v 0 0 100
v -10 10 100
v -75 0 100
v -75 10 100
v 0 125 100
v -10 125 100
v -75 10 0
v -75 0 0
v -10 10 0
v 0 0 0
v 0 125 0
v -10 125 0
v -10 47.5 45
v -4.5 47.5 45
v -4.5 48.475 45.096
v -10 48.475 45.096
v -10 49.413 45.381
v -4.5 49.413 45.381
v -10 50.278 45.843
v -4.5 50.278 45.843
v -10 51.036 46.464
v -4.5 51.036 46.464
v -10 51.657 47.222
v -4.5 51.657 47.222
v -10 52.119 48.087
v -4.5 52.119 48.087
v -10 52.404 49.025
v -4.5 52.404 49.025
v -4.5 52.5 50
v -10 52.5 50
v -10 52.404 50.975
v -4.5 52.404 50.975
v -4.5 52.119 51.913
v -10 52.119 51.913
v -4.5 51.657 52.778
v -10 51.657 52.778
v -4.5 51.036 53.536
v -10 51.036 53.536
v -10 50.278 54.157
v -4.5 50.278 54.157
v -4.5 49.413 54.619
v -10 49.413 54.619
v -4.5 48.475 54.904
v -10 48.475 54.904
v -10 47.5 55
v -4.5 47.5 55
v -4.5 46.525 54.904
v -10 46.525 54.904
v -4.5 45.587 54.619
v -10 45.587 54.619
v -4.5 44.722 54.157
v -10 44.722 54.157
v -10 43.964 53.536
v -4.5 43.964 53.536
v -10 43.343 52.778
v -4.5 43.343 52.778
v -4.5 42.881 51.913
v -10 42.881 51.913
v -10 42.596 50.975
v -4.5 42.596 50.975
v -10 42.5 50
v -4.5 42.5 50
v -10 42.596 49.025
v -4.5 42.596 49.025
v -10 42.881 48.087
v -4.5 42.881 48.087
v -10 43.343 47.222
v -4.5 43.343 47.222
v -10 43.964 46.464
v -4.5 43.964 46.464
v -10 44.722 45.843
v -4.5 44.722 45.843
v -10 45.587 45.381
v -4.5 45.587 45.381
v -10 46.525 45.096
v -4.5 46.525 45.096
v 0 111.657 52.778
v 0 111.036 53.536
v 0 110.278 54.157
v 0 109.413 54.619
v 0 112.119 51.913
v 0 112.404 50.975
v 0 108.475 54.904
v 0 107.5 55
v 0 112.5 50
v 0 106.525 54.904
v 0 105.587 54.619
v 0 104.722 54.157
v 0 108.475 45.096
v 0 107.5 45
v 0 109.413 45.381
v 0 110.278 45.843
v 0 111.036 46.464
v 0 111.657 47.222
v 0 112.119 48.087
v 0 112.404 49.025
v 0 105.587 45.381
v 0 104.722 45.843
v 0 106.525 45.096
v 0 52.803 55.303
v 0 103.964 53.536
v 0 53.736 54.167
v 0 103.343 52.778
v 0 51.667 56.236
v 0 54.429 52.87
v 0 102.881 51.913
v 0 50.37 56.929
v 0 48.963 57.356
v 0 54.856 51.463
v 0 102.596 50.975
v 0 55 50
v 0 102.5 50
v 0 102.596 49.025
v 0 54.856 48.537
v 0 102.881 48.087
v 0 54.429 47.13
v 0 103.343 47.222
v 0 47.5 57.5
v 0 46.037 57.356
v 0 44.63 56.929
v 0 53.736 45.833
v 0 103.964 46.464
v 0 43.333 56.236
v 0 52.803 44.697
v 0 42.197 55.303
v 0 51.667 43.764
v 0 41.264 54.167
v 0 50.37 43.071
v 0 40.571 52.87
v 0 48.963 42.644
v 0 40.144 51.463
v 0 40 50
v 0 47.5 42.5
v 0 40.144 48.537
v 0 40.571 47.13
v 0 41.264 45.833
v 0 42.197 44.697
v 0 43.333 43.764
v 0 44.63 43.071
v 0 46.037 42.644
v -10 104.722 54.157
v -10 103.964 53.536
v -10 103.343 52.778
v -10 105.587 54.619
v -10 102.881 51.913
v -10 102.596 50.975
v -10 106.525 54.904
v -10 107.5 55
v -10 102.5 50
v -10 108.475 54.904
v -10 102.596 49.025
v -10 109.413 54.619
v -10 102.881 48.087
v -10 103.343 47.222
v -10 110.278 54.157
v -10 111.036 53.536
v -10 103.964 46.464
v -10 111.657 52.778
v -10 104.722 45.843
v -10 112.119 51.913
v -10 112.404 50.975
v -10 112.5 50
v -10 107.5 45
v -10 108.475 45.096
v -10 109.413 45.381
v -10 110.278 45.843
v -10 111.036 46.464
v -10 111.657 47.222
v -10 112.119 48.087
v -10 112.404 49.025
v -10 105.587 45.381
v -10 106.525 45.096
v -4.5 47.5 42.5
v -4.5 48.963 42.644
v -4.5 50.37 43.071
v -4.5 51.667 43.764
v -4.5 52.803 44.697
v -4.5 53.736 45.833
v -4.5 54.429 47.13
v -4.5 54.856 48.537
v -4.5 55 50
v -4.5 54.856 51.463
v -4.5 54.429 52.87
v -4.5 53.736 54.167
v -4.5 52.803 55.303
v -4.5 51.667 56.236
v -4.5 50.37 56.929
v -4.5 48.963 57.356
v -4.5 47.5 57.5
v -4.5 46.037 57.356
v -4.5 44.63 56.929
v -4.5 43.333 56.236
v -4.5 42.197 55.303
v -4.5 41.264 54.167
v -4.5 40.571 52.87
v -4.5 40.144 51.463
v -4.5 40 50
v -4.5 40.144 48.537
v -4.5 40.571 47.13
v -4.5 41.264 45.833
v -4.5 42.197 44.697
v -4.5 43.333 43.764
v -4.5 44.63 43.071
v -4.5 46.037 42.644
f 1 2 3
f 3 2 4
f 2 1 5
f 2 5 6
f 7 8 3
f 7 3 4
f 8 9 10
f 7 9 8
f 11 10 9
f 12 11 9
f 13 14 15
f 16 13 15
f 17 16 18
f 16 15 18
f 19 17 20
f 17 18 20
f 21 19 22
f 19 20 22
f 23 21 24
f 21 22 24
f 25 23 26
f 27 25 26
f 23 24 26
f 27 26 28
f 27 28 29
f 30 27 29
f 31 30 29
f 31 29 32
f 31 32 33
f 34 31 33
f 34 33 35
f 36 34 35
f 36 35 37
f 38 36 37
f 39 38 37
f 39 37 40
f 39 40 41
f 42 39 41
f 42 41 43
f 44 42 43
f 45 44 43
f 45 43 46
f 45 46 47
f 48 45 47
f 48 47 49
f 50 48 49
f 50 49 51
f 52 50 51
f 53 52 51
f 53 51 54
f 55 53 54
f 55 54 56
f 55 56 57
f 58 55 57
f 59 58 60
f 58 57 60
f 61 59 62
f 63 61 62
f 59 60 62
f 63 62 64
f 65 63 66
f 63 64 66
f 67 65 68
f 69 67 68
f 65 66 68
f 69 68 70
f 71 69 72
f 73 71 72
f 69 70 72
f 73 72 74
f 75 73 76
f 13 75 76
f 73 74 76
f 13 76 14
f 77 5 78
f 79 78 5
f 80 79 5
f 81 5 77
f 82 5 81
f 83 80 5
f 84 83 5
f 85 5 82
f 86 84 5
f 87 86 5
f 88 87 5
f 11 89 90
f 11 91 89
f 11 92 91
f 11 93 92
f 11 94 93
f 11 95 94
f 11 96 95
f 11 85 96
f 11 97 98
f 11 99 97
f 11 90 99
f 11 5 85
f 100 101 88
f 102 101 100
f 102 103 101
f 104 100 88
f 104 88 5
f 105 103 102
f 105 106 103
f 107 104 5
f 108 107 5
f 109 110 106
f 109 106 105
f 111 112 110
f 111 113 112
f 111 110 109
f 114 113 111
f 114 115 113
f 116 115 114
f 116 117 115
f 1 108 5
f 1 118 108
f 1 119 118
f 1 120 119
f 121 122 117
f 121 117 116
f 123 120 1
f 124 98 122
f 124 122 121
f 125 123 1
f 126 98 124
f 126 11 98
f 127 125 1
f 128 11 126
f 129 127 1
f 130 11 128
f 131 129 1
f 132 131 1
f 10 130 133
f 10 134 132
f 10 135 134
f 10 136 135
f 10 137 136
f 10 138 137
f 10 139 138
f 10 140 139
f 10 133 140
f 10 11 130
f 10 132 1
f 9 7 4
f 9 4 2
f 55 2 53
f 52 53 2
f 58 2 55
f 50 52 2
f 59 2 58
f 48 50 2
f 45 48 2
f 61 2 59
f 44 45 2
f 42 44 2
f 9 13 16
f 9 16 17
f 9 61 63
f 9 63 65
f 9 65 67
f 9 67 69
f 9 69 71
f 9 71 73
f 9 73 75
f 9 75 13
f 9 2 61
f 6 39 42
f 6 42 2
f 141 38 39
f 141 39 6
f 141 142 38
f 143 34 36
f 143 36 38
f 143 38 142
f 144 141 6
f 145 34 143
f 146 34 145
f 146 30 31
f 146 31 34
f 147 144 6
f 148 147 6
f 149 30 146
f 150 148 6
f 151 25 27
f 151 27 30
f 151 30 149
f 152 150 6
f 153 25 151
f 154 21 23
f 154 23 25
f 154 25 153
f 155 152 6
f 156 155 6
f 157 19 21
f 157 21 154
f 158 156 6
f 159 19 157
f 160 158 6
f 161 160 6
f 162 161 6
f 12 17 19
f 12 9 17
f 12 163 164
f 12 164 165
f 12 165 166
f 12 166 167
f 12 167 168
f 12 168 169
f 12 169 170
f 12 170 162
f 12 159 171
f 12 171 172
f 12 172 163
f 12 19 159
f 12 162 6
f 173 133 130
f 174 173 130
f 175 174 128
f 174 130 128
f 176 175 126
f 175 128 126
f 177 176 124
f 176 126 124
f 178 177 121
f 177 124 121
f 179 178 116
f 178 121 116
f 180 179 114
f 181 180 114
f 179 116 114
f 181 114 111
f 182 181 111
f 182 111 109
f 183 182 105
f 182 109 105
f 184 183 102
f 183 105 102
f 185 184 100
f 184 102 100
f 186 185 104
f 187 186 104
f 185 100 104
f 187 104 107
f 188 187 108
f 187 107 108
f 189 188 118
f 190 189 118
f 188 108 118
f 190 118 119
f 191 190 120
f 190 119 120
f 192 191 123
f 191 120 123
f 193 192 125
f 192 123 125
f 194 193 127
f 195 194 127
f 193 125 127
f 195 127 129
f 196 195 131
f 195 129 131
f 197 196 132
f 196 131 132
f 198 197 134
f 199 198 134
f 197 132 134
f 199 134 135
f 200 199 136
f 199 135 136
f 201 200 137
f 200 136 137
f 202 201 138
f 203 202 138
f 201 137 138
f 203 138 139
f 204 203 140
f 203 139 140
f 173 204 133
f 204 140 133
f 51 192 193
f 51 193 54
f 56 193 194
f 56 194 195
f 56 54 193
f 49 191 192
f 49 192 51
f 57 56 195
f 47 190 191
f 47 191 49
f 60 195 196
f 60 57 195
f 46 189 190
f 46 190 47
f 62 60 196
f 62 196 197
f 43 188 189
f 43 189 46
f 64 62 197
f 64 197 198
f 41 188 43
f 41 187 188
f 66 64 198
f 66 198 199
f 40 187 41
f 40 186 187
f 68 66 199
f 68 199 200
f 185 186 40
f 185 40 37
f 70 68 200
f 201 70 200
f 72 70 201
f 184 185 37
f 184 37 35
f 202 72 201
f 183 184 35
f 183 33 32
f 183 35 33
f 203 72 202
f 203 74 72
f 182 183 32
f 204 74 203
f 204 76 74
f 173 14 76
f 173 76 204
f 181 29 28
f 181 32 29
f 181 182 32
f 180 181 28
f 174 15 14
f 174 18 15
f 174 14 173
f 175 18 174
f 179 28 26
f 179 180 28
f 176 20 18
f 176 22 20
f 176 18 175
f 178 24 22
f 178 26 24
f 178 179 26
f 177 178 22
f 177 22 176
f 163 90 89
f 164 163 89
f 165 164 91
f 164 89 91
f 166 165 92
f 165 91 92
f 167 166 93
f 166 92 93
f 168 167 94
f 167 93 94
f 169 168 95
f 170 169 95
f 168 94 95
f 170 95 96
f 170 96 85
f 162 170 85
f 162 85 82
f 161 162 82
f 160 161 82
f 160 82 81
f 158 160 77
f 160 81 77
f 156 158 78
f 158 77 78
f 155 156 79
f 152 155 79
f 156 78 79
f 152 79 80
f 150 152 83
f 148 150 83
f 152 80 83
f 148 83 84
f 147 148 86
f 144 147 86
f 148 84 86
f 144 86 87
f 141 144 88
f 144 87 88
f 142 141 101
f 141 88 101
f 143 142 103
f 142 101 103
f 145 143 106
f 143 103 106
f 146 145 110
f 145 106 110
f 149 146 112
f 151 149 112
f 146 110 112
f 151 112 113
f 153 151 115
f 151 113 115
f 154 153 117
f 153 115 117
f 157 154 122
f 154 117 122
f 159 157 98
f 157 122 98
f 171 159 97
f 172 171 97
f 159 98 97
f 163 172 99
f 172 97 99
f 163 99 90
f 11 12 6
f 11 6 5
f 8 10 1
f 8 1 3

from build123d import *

# Parameters (mm, degrees)
EXTRUIR_L_MINA1_DEPTH = 100
CROQUIS2_R            = 5
CORTAR_EXTRUIR1_DEPTH = 10
CROQUIS3_R            = 7.5
CORTAR_EXTRUIR2_DEPTH = 4.5


with BuildPart() as part:
    # Croquis1 → Extruir-Lámina1 (new body)
    with BuildSketch(Plane.XY):
        Polygon((0, 125), (0, 0), (-75, 0), (-75, 10), (-10, 10), (-10, 125), align=None)
    extrude(amount=EXTRUIR_L_MINA1_DEPTH)

    # Croquis2 → Cortar-Extruir1 (cut)
    with BuildSketch(Plane(origin=(0, 0, 0), x_dir=(0, 0, -1), z_dir=(1, 0, 0))):
        with Locations((-50, 107.5)):
            Circle(CROQUIS2_R)
        with Locations((-50, 47.5)):
            Circle(CROQUIS2_R)
    extrude(amount=-CORTAR_EXTRUIR1_DEPTH, mode=Mode.SUBTRACT)

    # Croquis3 → Cortar-Extruir2 (cut)
    with BuildSketch(Plane(origin=(0, 0, 0), x_dir=(0, 0, -1), z_dir=(1, 0, 0))):
        with Locations((-50, 47.5)):
            Circle(CROQUIS3_R)
    extrude(amount=-CORTAR_EXTRUIR2_DEPTH, mode=Mode.SUBTRACT)


solid = part.part
